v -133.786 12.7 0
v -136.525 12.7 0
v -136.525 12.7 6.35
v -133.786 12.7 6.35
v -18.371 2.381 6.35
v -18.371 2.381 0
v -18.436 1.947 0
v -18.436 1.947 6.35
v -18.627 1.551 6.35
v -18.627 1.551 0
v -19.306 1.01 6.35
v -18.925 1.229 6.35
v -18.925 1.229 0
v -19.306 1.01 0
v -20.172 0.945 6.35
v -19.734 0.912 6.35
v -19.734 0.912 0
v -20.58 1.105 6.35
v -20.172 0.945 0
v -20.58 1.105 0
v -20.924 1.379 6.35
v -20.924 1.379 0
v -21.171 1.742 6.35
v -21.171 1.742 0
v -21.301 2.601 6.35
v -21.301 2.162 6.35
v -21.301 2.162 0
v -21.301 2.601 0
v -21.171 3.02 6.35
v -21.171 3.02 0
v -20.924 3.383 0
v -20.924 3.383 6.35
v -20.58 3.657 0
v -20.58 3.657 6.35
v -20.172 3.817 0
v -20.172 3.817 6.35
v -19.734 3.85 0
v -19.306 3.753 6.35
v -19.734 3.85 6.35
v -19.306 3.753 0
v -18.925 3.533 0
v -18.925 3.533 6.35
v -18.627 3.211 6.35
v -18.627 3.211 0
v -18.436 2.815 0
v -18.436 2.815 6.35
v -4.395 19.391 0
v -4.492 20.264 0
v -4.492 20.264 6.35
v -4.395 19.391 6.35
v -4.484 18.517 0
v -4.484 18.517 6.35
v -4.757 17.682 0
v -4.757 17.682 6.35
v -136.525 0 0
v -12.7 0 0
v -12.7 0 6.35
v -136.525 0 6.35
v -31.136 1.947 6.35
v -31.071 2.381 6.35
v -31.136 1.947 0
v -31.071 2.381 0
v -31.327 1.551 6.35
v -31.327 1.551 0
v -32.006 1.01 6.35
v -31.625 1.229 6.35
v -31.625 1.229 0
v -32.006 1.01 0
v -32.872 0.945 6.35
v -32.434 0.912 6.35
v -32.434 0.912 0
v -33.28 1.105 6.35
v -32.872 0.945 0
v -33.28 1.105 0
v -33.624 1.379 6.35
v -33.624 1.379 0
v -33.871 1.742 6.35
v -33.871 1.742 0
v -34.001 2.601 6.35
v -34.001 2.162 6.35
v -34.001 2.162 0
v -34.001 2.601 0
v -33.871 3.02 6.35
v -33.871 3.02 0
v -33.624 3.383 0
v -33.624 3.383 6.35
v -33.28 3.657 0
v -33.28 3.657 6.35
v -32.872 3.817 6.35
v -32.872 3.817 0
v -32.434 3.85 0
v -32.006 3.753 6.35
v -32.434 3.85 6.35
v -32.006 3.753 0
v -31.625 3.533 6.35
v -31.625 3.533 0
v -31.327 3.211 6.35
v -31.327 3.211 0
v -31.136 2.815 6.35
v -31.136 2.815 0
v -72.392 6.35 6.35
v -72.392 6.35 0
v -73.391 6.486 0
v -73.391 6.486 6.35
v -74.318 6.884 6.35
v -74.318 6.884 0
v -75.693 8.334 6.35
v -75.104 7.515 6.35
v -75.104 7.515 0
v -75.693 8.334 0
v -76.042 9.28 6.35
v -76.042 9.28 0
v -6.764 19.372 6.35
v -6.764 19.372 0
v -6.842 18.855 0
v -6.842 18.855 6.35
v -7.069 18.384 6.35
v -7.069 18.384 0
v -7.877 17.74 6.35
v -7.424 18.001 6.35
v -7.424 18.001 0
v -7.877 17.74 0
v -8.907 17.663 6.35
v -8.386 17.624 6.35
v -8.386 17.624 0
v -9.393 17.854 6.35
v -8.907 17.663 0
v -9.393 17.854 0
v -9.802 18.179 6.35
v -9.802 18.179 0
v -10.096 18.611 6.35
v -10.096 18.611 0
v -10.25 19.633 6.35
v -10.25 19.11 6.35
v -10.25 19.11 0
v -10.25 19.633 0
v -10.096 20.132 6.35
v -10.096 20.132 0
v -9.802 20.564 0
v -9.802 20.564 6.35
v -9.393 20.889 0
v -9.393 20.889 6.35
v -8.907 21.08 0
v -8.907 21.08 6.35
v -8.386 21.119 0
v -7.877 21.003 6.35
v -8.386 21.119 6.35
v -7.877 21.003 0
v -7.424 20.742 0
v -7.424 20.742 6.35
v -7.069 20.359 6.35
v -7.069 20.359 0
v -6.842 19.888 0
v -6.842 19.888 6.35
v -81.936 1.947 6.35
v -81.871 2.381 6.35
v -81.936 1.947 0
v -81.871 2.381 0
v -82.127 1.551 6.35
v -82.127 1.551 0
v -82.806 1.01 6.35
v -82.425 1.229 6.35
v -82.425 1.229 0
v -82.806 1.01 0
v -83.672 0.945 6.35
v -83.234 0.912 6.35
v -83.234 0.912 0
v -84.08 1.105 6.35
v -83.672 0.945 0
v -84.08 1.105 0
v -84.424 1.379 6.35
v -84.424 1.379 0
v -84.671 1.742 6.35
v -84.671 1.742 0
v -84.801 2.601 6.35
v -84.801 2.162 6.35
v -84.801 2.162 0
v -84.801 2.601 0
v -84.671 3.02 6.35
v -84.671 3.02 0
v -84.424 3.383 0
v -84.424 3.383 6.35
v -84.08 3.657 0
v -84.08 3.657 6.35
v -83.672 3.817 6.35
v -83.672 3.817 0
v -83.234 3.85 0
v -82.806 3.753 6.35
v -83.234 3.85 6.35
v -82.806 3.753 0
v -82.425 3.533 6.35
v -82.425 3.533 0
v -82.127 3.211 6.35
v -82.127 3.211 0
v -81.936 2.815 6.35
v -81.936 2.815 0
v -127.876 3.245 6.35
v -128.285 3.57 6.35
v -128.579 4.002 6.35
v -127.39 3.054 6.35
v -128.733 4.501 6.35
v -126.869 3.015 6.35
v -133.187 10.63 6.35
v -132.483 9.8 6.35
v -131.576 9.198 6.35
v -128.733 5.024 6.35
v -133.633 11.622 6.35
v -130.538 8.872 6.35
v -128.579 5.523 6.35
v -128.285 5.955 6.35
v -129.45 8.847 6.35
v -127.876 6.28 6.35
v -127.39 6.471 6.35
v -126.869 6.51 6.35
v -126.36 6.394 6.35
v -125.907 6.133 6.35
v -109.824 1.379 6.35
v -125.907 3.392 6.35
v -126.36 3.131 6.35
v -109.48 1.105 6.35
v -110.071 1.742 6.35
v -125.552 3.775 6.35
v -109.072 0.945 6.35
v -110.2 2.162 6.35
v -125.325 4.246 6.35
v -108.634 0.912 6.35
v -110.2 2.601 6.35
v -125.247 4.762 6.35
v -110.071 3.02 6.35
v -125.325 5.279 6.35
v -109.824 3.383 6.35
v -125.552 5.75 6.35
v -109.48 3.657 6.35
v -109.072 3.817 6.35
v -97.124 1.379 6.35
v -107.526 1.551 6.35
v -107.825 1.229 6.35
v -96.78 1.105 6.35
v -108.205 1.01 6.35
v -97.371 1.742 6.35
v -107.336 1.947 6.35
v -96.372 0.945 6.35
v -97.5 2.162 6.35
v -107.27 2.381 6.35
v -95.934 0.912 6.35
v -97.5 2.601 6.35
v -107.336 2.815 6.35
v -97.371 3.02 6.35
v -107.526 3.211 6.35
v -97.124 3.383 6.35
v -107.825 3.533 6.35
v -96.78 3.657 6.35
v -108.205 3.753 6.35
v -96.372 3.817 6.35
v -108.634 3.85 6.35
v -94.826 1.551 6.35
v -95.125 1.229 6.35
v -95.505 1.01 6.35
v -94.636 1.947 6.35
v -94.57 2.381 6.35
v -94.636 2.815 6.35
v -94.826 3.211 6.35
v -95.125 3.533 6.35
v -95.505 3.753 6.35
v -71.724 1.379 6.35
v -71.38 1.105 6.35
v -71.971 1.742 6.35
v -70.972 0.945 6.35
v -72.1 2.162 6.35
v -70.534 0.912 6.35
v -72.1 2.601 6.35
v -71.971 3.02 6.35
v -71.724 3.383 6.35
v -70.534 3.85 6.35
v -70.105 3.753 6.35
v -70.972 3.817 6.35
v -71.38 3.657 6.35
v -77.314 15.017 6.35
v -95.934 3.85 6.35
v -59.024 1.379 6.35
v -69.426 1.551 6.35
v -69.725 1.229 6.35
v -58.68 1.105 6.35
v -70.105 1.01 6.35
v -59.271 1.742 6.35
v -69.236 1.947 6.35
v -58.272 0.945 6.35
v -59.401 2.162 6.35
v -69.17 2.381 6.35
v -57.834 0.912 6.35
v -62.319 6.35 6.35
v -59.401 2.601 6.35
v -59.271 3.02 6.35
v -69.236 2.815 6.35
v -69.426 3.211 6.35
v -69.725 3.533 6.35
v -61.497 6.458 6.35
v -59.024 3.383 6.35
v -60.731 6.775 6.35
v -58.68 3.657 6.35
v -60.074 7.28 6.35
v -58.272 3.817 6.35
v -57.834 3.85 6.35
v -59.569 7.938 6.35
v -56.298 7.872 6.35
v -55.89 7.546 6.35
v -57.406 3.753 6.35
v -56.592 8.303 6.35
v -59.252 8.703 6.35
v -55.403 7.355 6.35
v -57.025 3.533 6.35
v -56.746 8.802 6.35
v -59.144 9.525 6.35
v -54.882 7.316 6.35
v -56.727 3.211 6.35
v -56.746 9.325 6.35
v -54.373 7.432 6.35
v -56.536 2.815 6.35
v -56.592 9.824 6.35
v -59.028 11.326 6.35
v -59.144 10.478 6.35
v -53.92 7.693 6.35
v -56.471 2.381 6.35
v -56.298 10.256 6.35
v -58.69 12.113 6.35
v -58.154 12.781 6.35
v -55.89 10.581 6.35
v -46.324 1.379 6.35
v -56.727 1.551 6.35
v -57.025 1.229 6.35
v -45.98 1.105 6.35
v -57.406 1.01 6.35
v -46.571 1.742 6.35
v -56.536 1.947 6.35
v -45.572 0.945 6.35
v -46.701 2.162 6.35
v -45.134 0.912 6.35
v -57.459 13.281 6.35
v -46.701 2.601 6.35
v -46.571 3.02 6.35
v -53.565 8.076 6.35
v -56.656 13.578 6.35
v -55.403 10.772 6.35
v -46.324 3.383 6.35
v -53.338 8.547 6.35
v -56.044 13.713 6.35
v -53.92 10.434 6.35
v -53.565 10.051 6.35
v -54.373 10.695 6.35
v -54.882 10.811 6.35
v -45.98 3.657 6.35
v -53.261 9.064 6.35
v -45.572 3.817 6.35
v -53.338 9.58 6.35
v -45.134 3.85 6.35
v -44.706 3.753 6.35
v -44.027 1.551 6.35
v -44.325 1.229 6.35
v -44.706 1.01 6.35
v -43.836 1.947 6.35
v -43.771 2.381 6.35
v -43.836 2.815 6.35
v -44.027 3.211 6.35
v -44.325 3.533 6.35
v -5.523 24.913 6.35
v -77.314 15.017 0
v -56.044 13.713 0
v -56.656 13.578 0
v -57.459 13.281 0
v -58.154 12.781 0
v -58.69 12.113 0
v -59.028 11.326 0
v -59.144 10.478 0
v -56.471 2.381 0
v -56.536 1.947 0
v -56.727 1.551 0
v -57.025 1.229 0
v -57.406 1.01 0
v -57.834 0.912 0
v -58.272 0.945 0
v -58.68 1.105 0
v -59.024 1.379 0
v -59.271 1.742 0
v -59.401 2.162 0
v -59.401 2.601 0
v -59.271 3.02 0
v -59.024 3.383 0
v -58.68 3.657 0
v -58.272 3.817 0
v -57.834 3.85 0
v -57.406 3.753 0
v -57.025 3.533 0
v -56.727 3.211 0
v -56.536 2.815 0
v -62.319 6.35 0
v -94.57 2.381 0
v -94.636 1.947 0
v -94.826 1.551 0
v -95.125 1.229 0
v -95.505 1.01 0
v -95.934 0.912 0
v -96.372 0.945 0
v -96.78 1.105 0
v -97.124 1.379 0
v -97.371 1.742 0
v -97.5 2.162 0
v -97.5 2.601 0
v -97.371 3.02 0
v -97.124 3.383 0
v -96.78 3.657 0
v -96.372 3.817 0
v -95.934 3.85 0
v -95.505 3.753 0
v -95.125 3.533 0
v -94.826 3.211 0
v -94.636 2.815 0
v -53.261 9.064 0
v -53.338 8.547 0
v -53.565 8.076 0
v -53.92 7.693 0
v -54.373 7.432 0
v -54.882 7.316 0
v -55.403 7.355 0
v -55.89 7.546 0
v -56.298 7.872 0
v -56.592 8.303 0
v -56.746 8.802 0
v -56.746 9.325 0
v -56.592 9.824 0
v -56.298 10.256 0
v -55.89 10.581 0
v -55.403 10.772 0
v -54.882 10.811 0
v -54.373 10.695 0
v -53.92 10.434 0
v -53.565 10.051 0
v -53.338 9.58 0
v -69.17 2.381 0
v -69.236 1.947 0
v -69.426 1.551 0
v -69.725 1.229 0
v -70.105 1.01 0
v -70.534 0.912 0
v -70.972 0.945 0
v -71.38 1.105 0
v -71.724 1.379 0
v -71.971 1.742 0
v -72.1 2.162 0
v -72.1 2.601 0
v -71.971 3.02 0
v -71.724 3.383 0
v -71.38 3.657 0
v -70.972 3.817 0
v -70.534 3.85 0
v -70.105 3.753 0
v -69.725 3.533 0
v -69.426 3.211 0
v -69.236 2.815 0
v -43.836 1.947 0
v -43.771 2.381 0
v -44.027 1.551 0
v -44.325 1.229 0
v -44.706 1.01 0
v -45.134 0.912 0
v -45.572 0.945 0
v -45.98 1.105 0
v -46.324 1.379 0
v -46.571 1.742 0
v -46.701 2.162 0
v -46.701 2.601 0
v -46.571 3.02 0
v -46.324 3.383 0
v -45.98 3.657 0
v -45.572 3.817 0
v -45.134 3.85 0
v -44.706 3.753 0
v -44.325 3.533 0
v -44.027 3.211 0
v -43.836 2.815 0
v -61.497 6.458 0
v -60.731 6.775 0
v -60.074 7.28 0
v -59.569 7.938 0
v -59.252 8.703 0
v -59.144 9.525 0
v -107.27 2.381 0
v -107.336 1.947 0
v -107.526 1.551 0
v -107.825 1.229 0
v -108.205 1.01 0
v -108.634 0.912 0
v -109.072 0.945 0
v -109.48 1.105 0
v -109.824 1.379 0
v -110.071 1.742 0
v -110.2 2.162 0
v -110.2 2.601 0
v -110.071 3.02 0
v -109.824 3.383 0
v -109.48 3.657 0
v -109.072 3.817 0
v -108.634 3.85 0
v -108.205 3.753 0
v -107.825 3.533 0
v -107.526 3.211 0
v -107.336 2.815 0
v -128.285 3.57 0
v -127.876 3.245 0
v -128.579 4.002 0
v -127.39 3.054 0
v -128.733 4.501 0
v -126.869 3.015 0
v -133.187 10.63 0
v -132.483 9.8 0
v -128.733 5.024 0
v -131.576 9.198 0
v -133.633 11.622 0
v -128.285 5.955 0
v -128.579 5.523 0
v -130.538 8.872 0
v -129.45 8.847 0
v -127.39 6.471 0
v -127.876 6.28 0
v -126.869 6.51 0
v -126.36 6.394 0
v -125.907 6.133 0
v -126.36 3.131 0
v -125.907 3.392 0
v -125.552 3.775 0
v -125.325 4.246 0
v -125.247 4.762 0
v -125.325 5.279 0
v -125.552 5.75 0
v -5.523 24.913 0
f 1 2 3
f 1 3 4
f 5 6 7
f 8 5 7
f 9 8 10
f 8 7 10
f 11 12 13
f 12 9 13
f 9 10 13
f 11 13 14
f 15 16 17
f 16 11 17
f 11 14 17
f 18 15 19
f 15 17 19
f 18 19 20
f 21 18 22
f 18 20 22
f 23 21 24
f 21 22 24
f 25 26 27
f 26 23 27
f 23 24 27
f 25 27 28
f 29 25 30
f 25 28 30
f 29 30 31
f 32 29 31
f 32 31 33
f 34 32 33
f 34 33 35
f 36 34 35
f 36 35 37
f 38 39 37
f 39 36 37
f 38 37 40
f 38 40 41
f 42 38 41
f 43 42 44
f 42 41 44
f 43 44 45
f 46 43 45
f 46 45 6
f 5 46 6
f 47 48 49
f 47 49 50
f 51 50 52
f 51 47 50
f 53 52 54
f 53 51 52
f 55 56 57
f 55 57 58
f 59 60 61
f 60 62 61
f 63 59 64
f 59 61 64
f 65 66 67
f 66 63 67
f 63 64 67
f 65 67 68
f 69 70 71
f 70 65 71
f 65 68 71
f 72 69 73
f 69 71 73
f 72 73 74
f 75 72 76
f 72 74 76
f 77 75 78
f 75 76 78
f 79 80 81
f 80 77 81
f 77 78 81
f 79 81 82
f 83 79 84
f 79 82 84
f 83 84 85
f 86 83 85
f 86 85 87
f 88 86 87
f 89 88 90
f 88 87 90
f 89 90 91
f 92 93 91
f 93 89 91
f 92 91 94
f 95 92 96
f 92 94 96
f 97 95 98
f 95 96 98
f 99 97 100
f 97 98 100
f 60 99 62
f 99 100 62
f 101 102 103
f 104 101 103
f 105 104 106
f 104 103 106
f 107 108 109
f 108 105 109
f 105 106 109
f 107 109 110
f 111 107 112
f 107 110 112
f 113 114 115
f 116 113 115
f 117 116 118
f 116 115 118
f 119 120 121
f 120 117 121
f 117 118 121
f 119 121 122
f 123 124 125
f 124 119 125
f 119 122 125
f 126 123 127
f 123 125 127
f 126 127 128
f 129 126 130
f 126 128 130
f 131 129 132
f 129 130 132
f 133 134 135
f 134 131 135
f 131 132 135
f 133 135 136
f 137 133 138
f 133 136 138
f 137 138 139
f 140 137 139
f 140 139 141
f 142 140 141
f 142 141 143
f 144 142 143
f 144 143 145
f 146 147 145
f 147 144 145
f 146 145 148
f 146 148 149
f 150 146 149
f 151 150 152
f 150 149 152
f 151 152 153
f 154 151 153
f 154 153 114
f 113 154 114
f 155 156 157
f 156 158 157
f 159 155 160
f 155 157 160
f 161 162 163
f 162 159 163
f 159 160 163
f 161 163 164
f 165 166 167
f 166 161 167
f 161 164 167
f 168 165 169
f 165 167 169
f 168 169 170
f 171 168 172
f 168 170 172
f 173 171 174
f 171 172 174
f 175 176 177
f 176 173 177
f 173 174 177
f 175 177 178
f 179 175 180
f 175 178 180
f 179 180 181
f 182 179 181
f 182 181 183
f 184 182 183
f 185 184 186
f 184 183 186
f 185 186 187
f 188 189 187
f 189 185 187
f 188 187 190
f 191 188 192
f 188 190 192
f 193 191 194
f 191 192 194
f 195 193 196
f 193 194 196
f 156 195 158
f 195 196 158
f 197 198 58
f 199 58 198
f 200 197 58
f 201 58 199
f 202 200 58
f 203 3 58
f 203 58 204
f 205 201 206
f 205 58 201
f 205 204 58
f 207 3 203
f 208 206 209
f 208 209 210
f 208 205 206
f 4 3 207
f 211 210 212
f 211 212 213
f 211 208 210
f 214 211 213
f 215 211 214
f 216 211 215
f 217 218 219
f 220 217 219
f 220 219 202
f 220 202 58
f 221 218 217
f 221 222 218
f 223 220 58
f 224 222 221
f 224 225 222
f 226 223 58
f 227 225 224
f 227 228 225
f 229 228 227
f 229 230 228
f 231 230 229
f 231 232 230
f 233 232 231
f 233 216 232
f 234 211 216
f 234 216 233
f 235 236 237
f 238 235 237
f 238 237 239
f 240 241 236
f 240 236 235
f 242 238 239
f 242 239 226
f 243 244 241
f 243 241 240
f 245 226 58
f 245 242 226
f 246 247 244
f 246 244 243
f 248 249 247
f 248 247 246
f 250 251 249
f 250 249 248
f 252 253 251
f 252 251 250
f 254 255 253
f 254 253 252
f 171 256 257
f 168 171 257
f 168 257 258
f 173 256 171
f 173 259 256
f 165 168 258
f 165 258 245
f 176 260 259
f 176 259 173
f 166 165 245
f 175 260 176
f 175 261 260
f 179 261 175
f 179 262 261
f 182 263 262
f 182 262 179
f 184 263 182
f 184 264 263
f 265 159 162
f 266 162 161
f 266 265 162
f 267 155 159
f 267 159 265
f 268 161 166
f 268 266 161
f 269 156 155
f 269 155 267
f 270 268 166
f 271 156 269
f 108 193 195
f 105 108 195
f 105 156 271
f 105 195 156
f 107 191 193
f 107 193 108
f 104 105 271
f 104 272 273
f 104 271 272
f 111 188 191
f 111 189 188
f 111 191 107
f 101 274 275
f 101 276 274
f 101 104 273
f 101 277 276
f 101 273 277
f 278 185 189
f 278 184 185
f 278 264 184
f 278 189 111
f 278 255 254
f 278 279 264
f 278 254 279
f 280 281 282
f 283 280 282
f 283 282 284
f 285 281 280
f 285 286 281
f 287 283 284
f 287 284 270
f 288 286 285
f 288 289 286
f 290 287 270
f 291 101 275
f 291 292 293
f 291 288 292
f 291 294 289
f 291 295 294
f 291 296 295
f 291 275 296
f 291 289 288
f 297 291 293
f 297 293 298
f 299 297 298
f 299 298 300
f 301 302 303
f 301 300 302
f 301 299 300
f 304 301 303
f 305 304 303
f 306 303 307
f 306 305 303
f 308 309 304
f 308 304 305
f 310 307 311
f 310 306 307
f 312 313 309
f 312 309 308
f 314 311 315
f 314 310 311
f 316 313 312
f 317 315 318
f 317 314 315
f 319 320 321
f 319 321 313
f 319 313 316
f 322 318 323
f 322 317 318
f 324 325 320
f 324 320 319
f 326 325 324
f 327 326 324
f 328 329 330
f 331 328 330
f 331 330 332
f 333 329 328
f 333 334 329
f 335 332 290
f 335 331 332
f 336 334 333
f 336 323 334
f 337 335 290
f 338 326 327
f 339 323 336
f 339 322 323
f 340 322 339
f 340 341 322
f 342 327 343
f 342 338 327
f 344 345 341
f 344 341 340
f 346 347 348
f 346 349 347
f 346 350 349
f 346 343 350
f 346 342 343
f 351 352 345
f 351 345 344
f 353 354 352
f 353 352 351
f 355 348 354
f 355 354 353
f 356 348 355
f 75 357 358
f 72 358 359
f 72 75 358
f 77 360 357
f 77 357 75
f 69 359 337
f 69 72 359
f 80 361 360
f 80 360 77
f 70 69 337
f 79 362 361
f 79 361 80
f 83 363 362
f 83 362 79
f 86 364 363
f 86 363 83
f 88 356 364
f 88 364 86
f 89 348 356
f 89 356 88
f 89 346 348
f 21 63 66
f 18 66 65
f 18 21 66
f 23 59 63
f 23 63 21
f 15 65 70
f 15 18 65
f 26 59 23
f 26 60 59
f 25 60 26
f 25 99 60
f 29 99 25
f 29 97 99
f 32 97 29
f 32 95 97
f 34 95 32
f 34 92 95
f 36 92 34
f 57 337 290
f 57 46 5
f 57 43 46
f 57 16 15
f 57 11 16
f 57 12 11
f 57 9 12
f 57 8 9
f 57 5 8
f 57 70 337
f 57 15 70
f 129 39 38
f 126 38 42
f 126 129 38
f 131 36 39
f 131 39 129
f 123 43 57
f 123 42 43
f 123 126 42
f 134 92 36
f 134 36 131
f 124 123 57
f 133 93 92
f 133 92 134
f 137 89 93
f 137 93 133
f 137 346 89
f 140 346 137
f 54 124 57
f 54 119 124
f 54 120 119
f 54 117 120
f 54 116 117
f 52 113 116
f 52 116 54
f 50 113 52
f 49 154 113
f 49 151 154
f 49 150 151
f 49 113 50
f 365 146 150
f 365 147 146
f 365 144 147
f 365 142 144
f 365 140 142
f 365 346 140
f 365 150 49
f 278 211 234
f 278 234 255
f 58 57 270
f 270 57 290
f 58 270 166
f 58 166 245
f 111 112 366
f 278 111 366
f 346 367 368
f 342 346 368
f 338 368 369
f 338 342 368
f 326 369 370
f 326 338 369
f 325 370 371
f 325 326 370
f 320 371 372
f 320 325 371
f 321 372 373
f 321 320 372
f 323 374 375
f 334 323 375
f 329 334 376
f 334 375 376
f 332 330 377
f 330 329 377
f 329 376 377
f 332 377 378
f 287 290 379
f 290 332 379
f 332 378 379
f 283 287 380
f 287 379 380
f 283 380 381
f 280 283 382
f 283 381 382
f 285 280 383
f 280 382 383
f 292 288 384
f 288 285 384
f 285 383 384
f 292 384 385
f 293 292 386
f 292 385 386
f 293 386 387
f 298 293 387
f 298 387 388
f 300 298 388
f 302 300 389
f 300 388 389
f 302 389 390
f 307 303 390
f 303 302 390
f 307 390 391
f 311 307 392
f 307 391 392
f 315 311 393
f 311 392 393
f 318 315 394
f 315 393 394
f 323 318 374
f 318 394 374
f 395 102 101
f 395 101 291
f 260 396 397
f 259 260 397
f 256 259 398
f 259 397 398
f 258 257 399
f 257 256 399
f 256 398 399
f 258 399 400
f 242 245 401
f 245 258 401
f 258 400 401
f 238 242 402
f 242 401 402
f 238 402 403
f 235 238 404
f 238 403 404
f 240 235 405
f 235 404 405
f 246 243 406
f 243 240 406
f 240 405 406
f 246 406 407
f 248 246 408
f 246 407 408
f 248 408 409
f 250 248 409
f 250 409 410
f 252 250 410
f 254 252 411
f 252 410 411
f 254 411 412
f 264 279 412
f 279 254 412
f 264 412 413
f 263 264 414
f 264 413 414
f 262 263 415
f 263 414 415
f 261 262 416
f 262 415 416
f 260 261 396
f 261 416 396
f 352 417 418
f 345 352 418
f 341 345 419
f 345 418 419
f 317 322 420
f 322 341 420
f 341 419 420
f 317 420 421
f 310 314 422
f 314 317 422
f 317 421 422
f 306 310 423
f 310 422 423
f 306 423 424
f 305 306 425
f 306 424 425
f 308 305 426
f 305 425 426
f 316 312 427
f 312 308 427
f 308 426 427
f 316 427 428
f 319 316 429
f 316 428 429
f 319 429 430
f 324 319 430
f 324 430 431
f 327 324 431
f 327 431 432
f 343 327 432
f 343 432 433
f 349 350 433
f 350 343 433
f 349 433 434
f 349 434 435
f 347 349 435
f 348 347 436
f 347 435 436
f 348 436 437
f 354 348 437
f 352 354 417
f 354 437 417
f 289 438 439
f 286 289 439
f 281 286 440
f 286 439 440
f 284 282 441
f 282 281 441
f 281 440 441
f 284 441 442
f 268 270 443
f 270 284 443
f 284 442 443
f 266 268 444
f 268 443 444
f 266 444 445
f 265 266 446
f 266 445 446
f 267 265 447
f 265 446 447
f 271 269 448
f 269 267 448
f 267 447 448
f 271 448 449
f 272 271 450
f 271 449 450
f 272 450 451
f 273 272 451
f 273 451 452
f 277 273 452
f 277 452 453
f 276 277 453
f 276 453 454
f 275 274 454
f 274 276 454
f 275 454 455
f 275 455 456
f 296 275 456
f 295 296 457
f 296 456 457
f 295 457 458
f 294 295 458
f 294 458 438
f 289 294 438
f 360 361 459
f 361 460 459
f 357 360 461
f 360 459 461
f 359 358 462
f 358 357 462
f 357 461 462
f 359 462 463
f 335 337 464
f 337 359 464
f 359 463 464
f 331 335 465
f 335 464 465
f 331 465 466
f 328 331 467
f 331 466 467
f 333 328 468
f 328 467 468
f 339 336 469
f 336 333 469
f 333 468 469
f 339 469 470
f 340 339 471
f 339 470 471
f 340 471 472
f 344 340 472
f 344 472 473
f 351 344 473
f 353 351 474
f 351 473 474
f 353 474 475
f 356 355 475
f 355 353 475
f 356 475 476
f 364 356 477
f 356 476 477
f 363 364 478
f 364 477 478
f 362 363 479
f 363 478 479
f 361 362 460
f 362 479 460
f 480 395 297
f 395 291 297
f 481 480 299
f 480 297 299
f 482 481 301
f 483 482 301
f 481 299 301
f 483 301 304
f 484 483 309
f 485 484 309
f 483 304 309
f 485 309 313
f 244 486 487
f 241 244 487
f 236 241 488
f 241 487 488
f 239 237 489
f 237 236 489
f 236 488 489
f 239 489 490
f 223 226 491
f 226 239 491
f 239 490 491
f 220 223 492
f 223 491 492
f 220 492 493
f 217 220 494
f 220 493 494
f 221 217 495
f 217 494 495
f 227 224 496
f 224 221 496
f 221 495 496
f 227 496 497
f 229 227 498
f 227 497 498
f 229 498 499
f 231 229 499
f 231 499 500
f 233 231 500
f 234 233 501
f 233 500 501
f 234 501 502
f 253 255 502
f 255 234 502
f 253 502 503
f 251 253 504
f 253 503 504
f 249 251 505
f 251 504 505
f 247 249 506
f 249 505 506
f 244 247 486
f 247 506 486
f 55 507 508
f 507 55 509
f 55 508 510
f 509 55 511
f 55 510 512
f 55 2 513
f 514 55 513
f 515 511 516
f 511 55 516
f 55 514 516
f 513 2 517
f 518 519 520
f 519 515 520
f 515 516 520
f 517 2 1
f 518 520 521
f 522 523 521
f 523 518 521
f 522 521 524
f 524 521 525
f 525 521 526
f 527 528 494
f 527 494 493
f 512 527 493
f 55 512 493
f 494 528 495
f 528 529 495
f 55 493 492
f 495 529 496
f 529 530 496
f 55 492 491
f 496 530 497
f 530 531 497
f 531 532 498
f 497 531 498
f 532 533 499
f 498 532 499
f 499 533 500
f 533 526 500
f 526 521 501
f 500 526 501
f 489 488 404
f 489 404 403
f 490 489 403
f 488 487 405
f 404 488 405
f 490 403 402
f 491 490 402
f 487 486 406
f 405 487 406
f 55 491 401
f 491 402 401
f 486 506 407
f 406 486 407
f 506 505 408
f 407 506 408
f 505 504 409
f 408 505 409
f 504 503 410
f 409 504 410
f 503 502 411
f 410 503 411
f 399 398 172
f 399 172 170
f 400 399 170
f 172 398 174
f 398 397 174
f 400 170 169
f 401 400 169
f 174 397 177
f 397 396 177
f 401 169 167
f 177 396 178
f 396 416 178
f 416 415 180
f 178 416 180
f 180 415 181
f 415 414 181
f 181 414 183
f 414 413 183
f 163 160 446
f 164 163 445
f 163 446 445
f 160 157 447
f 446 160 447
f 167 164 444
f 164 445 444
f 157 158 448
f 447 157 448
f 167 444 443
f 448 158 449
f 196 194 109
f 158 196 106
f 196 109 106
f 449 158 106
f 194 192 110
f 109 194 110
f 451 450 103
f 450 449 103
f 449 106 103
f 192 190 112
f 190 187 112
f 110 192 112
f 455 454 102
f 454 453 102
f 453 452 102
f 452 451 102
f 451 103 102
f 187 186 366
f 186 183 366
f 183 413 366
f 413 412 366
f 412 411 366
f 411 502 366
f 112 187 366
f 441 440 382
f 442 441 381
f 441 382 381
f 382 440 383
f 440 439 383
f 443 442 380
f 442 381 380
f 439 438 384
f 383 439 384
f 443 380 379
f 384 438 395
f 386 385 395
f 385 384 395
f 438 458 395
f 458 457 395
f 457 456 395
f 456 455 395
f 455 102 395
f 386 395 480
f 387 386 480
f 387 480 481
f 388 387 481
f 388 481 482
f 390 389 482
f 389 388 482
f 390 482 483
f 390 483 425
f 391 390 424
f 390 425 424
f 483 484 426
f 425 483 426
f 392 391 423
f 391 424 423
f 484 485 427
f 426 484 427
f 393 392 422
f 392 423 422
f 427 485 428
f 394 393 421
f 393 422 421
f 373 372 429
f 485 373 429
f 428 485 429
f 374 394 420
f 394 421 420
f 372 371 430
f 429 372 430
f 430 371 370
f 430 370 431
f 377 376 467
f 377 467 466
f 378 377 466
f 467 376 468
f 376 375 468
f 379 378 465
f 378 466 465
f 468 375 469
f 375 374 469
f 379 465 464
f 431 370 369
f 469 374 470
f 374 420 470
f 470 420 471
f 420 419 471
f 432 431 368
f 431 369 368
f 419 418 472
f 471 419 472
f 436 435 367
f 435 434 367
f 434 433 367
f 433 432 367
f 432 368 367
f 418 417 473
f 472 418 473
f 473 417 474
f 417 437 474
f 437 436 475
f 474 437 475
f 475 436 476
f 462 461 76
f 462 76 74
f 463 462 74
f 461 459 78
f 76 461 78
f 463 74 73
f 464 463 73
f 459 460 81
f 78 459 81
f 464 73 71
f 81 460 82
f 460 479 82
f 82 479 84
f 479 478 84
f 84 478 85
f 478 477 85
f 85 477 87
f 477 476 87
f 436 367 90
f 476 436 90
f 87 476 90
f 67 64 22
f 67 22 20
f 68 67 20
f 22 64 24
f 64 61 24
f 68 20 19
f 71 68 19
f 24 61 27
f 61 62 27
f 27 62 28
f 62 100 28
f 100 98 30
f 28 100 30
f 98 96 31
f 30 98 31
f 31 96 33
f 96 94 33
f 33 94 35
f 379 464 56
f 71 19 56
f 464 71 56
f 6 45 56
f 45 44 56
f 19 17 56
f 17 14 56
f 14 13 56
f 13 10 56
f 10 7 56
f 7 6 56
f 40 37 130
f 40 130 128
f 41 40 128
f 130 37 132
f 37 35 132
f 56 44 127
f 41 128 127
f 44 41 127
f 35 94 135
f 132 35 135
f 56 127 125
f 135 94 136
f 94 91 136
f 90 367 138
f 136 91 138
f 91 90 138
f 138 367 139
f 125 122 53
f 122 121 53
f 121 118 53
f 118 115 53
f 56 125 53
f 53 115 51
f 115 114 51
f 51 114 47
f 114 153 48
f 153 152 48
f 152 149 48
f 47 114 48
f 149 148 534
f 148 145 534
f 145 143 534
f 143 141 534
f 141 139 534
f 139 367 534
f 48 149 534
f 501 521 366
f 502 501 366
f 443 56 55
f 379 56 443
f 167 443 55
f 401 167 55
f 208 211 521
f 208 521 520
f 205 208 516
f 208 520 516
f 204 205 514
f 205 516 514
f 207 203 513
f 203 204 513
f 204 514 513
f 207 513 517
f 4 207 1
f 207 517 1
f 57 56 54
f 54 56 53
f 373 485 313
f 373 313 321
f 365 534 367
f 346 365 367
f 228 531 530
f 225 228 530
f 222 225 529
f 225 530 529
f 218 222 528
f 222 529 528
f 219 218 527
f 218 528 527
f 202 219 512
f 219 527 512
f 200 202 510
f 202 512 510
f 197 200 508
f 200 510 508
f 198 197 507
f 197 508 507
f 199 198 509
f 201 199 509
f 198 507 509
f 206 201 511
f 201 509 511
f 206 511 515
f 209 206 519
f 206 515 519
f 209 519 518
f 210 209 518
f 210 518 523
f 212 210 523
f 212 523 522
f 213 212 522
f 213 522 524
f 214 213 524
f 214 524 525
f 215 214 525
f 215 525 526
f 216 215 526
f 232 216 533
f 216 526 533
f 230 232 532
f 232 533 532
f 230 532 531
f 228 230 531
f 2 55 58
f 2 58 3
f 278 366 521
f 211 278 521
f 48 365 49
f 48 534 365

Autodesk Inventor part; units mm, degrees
ref_plane "YZ Plane" through (0, 0, 0) normal (1, 0, 0) x (0, 1, 0)
ref_plane "XZ Plane" through (0, 0, 0) normal (0, 1, 0) x (-1, 0, 0)
ref_plane "XY Plane" through (0, 0, 0) normal (0, 0, 1) x (1, 0, 0)
sketch "Sketch3" plane through (0, 0, 0) normal (0, 0, 1) x (1, 0, 0)
  line L0 (-48.8137, 10.438) -> (-52.9368, 29.0364) construction
  line L1 (-52.9368, 29.0364) -> (-59.1363, 27.662) construction
  line L2 (-59.1363, 27.662) -> (-55.0132, 9.0636) construction
  line L3 (-55.0132, 9.0636) -> (-48.8137, 10.438) construction
  line L4 (-48.8137, 10.438) -> (-59.1363, 27.662) construction
  line L5 (-52.9368, 29.0364) -> (-55.0132, 9.0636) construction
  circle A0 centre (-50.8753, 19.7372) radius 1.7526
  circle A1 centre (-59.1363, 27.662) radius 1.7526
  circle A2 centre (-55.0132, 9.0636) radius 1.7526
  line L6 (0, 0) -> (-127, 0)
  line L7 (0, 60.0769) -> (0, 0) construction
  line L8 (-44.6831, 6.4756) -> (-50.8679, 34.3732)
  line L9 (-50.8679, 34.3732) -> (-63.2669, 31.6244) construction
  line L10 (-63.2669, 31.6244) -> (-57.0821, 3.7268) construction
  line L11 (-57.0821, 3.7268) -> (-44.6831, 6.4756) construction
  line L12 (-44.6831, 6.4756) -> (-63.2669, 31.6244) construction
  line L13 (-50.8679, 34.3732) -> (-57.0821, 3.7268) construction
  line L14 (-45.2216, 8.9044) -> (-50.032, 30.6026)
  line L15 (-50.8679, 34.3732) -> (0, 45.6504) construction
  arc A3 (-128.0308, 9.4121) -> (-127, 0) centre (-127, 4.7625) ccw
  line L16 (-127, 0) -> (-127, 4.7625) construction
  line L17 (-128.0308, 9.4121) -> (-65.3965, 23.2978)
  line L18 (-9.6463, 43.5118) -> (0, 0)
  circle A4 centre (-127, 4.7625) radius 1.7526
  line L19 (-111.125, 0) -> (-12.7, 0) construction
  line L20 (-12.7, 0) -> (-12.7, 4.7625) construction
  line L21 (-12.7, 4.7625) -> (-111.125, 4.7625) construction
  line L22 (-111.125, 4.7625) -> (-111.125, 0) construction
  line L23 (-12.7, 2.3812) -> (-111.125, 2.3812) construction
  circle A5 centre (-108.7437, 2.3812) radius 1.4732
  circle A6 centre (-96.0437, 2.3812) radius 1.4732
  circle A7 centre (-83.3438, 2.3812) radius 1.4732
  circle A8 centre (-70.6437, 2.3812) radius 1.4732
  circle A9 centre (-57.9438, 2.3812) radius 1.4732
  circle A10 centre (-45.2438, 2.3812) radius 1.4732
  circle A11 centre (-32.5438, 2.3812) radius 1.4732
  circle A12 centre (-19.8438, 2.3812) radius 1.4732
  circle A13 centre (-8.5171, 19.3715) radius 1.7526
  line L24 (-55.0132, 9.0636) -> (-8.5171, 19.3715) construction
  line L25 (-53.9824, 4.414) -> (-8.0676, 14.593) construction
  line L26 (-5.5232, 24.9134) -> (-56.0439, 13.7132)
  arc A14 (-56.0439, 13.7132) -> (-53.9824, 4.414) centre (-55.0132, 9.0636) ccw construction
  line L27 (-5.5232, 24.9134) -> (-76.0422, 9.2797)
  line L28 (-76.0422, 9.2797) -> (-78.5057, 20.3916)
  line L29 (-78.5057, 20.3916) -> (-7.9866, 36.0253)
  line L30 (-7.9866, 36.0253) -> (-5.5232, 24.9134)
  line L31 (-50.5317, 18.1873) -> (-129.4495, 8.8468)
  line L32 (-59.1437, 13.026) -> (-76.0422, 13.026) construction
  line L33 (-76.0422, 13.026) -> (-76.0422, 6.35) construction
  line L34 (-76.0422, 6.35) -> (-59.1437, 6.35)
  line L35 (-59.1437, 6.35) -> (-59.1437, 13.026)
  arc A15 (-76.0422, 9.2797) -> (-72.3919, 6.35) centre (-72.3919, 10.0889) ccw
  line L36 (-127, 0) -> (-136.525, 0)
  line L37 (-136.525, 0) -> (-136.525, 12.7)
  line L38 (-136.525, 12.7) -> (-127, 12.7)
  line L39 (-127, 12.7) -> (-127, 0)
  arc A16 (-133.7857, 12.7) -> (-129.4495, 8.8468) centre (-129.9056, 12.7) ccw
  circle A17 centre (-8.5171, 19.3715) radius 4.1224
  line L40 (-12.7, 0) -> (-4.7567, 17.6823)
  point P0 (-53.975, 19.05)
  point P1 (-53.975, 19.05)
  point P2 (-53.975, 19.05)
  point P3 (-127, 0)
  point P4 (-46.7447, 15.7748)
  point P5 (-78.5057, 20.3916)
  point P6 (-77.3143, 15.0174)
  point P7 (-4.4924, 20.2638)
  dimension "d71" = 19.05
  dimension "d72" = 6.35
  dimension "d73" = 3.5052
  dimension "d74" = 3.5052
  dimension "d75" = 3.5052
  dimension "d76" = 127
  dimension "d77" = 19.05
  dimension "d78" = 12.5
  dimension "d91" = 12.7
  dimension "d92" = 28.575
  dimension "d93" = 53.975
  dimension "d98" = 9.525
  dimension "d107" = 3.5052
  dimension "d108" = 98.425
  dimension "d109" = 4.7625
  dimension "d110" = 15.875
  dimension "d111" = 2.9464
  dimension "d112" = 2.3813
  dimension "d115" = 12.7
  dimension "d120" = 3.5052
  dimension "d127" = 3.175
  dimension "d129" = 6.75
  dimension "d135" = 47.625
  dimension "d136" = 72.2313
  dimension "d137" = 4.7625
  dimension "d138" = 6.35
  dimension "d139" = 9.525
  dimension "d140" = 12.7
extrude "Extrusion3" add sketch "Sketch3" along normal blind 6.35 contours L28 A15 L34 L35 L27 L26 L18 A17 L40 L6 L39 A4 L31 | L39 A4 A3 L31 | A3 L36 L37 L38 A16 | A17
extrude "Extrusion4" cut sketch "Sketch3" along normal through all contours A13
fillet "Fillet7" radius 3.175 2 edges at (-59.1437, 13.026, 3.175) (-59.1437, 6.35, 3.175)
equation "\"Angle_Mount\" = 105deg"
equation "\"Rail_Offset\" = 36.5125"
properties part number "Uprights" material "UHMW, White"
